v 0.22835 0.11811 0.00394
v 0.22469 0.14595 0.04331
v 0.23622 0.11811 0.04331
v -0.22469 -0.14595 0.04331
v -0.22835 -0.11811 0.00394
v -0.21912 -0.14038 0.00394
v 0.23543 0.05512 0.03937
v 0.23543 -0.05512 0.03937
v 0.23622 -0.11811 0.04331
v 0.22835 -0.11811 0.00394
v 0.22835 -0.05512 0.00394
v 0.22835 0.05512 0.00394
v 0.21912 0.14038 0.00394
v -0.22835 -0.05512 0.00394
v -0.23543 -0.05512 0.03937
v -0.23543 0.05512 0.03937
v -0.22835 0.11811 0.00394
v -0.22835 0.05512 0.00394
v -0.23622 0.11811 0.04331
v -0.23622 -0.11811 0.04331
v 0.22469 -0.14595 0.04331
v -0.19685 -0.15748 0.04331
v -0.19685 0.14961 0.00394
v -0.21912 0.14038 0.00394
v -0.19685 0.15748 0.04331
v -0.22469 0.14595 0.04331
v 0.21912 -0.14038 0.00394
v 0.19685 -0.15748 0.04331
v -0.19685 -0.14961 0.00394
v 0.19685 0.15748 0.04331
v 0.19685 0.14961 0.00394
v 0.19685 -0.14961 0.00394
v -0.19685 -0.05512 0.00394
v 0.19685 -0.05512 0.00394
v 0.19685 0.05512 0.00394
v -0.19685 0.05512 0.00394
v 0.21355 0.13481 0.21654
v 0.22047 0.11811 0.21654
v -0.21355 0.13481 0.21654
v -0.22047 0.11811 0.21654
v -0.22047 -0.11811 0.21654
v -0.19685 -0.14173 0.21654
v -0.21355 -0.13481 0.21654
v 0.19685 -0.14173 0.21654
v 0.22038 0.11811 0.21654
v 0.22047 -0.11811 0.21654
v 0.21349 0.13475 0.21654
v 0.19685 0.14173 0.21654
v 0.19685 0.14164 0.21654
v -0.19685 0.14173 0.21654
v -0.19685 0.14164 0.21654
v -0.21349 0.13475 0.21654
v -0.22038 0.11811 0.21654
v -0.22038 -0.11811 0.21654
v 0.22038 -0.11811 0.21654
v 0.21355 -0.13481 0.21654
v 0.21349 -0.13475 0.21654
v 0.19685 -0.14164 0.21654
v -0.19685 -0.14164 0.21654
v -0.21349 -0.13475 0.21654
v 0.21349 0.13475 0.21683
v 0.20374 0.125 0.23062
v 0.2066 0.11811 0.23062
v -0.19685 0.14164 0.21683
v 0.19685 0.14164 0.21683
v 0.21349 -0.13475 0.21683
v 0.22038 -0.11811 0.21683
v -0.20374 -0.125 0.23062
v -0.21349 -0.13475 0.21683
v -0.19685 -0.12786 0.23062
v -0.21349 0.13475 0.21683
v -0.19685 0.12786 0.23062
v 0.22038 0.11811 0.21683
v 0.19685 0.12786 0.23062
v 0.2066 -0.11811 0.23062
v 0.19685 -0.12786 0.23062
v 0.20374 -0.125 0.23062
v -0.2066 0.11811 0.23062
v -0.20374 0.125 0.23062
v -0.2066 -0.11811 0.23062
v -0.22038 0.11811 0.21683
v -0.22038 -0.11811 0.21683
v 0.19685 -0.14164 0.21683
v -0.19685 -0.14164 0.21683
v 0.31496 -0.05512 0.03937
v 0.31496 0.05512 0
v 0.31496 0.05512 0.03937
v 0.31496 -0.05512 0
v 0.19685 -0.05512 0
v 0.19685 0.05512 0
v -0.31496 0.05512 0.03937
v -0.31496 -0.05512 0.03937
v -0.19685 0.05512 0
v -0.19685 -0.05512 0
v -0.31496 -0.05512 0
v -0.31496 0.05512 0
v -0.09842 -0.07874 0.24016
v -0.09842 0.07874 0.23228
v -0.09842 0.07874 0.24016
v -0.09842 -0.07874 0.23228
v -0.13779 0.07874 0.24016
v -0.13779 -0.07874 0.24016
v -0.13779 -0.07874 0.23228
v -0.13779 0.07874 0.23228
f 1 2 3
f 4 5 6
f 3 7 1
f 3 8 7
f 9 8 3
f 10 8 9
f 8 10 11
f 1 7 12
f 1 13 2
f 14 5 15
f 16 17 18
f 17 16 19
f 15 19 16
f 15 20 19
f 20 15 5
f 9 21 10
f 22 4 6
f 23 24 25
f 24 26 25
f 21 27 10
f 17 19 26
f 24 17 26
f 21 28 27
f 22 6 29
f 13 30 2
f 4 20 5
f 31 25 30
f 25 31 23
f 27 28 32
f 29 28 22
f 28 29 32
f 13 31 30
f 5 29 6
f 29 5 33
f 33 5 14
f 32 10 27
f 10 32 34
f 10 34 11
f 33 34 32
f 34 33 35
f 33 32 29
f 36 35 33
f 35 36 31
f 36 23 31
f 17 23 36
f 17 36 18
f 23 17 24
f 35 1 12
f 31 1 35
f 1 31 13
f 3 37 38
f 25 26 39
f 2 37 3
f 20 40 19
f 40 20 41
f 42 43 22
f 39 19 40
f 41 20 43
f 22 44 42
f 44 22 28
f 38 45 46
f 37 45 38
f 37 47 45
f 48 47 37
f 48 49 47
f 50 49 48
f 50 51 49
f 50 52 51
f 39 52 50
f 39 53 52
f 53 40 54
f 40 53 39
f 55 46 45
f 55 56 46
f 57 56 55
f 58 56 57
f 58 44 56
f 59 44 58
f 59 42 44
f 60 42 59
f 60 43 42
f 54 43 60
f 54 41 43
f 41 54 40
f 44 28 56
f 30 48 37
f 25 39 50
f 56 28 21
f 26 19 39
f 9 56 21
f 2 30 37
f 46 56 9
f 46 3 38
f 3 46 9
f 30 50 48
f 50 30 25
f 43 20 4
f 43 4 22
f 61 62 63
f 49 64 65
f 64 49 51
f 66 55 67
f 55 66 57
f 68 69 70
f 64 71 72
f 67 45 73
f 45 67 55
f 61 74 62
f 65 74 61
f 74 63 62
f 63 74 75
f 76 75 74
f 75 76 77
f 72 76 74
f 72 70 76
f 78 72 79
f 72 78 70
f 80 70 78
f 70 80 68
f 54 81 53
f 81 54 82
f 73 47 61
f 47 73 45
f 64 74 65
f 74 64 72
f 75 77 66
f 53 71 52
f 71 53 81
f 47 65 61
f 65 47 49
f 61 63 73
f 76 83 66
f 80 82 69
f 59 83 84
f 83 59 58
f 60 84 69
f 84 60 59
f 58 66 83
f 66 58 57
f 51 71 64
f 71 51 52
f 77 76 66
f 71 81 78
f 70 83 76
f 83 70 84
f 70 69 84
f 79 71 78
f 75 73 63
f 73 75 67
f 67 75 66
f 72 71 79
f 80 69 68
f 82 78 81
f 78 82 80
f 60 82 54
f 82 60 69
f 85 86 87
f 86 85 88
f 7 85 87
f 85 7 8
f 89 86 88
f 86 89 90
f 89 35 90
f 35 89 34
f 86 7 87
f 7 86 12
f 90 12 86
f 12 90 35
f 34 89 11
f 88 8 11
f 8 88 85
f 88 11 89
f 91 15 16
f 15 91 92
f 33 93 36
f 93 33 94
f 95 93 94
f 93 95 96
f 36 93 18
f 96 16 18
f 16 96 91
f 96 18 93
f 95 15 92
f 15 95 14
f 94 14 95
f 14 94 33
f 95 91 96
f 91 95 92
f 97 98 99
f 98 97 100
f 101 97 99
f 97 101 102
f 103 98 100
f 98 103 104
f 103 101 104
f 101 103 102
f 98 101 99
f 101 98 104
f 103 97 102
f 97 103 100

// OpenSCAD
// file: defines.scad
L = 3.0;  // Длина
W = 3.0;  // Ширина
H = 1.0;  // Высота
Hf = 0.04;  // Возвышение над платой (высота выводов)
e = 0.5;    // Шаг выводов

pin_fragments = 16;

A = 0.60;
E = 1.60;
E1 = 1.20;
D = 0.80;
b = 0.28; // 0.25 .. 0.35
c = 0.10; // 0.07 .. 0.20
L = 0.20;
L1 = 0.1; // 0.05 .. 0.20


scale = 1/2.54;
// file: SOD-523-label.scad
include <defines.scad>

/*font = "Liberation Sans";*/
/*font = "DejaVu";*/
/*font = "Abyssinica SIL";*/

/*$fn = 64;*/

// Label
scale(scale) color("White")  {

    translate([-0.3, 0, A]) {
        /*cylinder(r = 0.12, h = 0.02);*/
        cube([0.1,0.4,0.02], center = true);
    }

}
// file: SOD-523-pins.scad
include <defines.scad>

/*module Pin(x, y, z, r) {

    translate([-0.39,0,0.15]) cube(size = [0.015, p_h, 0.1],center=true); // На боковине
}*/

scale(scale) color("Silver") {
  translate([E1/2 - L1, -b/2, 0])
    cube([(E - E1) / 2 + L1, b, c]);
  mirror([1,0,0])
  translate([E1/2 - L1, -b/2, 0])
    cube([(E - E1) / 2 + L1, b, c]);
}
// file: SOD-523-body.scad
include <defines.scad>

fn1 = 8;
fn2 = 8;


R = 0.1;
R1 = 0.08;
R2 = 0.06;

o2 = -0.014;
k2 = 0.0047;

scale(scale)
color([0.25,0.25,0.25])
translate([0, 0, 0.01])
union() {

  /*translate([-E1 / 2, -D / 2, 0]) cube([E1, D, A]);*/

  hull(){
    translate([E1/2 - R, D/2 - R, 0]) cylinder(r1=R1, r2=R, h=c, center=false, $fn=fn1);
    translate([-E1/2 + R, D/2 - R, 0]) cylinder(r1=R1, r2=R, h=c, center=false, $fn=fn1);
    translate([E1/2 - R, -D/2 + R, 0]) cylinder(r1=R1, r2=R, h=c, center=false, $fn=fn1);
    translate([-E1/2 + R, -D/2 + R, 0]) cylinder(r1=R1, r2=R, h=c, center=false, $fn=fn1);
  }

  hull(){
    translate([E1/2 - R, D/2 - R, c]) cylinder(r1=R, r2=R2, h=A-c-R2, center=false, $fn=fn1);
    translate([-E1/2 + R, D/2 - R, c]) cylinder(r1=R, r2=R2, h=A-c-R2, center=false, $fn=fn1);
    translate([E1/2 - R, -D/2 + R, c]) cylinder(r1=R, r2=R2, h=A-c-R2, center=false, $fn=fn1);
    translate([-E1/2 + R, -D/2 + R, c]) cylinder(r1=R, r2=R2, h=A-c-R2, center=false, $fn=fn1);
  }

  translate([0,0,-0.01 + o2])
  hull(){
    translate([E1/2 - R, D/2 - R , A - R2]) sphere(r=R2+k2, $fn=fn2);
    translate([-E1/2 + R, D/2 - R , A - R2]) sphere(r=R2+k2, $fn=fn2);
    translate([E1/2 - R, -D/2 + R , A-R2]) sphere(r=R2+k2, $fn=fn2);
    translate([-E1/2 + R, -D/2 + R , A-R2]) sphere(r=R2+k2, $fn=fn2);
  }

}
// main file
include <SOD-523-body.scad>
include <SOD-523-pins.scad>
include <SOD-523-label.scad>
